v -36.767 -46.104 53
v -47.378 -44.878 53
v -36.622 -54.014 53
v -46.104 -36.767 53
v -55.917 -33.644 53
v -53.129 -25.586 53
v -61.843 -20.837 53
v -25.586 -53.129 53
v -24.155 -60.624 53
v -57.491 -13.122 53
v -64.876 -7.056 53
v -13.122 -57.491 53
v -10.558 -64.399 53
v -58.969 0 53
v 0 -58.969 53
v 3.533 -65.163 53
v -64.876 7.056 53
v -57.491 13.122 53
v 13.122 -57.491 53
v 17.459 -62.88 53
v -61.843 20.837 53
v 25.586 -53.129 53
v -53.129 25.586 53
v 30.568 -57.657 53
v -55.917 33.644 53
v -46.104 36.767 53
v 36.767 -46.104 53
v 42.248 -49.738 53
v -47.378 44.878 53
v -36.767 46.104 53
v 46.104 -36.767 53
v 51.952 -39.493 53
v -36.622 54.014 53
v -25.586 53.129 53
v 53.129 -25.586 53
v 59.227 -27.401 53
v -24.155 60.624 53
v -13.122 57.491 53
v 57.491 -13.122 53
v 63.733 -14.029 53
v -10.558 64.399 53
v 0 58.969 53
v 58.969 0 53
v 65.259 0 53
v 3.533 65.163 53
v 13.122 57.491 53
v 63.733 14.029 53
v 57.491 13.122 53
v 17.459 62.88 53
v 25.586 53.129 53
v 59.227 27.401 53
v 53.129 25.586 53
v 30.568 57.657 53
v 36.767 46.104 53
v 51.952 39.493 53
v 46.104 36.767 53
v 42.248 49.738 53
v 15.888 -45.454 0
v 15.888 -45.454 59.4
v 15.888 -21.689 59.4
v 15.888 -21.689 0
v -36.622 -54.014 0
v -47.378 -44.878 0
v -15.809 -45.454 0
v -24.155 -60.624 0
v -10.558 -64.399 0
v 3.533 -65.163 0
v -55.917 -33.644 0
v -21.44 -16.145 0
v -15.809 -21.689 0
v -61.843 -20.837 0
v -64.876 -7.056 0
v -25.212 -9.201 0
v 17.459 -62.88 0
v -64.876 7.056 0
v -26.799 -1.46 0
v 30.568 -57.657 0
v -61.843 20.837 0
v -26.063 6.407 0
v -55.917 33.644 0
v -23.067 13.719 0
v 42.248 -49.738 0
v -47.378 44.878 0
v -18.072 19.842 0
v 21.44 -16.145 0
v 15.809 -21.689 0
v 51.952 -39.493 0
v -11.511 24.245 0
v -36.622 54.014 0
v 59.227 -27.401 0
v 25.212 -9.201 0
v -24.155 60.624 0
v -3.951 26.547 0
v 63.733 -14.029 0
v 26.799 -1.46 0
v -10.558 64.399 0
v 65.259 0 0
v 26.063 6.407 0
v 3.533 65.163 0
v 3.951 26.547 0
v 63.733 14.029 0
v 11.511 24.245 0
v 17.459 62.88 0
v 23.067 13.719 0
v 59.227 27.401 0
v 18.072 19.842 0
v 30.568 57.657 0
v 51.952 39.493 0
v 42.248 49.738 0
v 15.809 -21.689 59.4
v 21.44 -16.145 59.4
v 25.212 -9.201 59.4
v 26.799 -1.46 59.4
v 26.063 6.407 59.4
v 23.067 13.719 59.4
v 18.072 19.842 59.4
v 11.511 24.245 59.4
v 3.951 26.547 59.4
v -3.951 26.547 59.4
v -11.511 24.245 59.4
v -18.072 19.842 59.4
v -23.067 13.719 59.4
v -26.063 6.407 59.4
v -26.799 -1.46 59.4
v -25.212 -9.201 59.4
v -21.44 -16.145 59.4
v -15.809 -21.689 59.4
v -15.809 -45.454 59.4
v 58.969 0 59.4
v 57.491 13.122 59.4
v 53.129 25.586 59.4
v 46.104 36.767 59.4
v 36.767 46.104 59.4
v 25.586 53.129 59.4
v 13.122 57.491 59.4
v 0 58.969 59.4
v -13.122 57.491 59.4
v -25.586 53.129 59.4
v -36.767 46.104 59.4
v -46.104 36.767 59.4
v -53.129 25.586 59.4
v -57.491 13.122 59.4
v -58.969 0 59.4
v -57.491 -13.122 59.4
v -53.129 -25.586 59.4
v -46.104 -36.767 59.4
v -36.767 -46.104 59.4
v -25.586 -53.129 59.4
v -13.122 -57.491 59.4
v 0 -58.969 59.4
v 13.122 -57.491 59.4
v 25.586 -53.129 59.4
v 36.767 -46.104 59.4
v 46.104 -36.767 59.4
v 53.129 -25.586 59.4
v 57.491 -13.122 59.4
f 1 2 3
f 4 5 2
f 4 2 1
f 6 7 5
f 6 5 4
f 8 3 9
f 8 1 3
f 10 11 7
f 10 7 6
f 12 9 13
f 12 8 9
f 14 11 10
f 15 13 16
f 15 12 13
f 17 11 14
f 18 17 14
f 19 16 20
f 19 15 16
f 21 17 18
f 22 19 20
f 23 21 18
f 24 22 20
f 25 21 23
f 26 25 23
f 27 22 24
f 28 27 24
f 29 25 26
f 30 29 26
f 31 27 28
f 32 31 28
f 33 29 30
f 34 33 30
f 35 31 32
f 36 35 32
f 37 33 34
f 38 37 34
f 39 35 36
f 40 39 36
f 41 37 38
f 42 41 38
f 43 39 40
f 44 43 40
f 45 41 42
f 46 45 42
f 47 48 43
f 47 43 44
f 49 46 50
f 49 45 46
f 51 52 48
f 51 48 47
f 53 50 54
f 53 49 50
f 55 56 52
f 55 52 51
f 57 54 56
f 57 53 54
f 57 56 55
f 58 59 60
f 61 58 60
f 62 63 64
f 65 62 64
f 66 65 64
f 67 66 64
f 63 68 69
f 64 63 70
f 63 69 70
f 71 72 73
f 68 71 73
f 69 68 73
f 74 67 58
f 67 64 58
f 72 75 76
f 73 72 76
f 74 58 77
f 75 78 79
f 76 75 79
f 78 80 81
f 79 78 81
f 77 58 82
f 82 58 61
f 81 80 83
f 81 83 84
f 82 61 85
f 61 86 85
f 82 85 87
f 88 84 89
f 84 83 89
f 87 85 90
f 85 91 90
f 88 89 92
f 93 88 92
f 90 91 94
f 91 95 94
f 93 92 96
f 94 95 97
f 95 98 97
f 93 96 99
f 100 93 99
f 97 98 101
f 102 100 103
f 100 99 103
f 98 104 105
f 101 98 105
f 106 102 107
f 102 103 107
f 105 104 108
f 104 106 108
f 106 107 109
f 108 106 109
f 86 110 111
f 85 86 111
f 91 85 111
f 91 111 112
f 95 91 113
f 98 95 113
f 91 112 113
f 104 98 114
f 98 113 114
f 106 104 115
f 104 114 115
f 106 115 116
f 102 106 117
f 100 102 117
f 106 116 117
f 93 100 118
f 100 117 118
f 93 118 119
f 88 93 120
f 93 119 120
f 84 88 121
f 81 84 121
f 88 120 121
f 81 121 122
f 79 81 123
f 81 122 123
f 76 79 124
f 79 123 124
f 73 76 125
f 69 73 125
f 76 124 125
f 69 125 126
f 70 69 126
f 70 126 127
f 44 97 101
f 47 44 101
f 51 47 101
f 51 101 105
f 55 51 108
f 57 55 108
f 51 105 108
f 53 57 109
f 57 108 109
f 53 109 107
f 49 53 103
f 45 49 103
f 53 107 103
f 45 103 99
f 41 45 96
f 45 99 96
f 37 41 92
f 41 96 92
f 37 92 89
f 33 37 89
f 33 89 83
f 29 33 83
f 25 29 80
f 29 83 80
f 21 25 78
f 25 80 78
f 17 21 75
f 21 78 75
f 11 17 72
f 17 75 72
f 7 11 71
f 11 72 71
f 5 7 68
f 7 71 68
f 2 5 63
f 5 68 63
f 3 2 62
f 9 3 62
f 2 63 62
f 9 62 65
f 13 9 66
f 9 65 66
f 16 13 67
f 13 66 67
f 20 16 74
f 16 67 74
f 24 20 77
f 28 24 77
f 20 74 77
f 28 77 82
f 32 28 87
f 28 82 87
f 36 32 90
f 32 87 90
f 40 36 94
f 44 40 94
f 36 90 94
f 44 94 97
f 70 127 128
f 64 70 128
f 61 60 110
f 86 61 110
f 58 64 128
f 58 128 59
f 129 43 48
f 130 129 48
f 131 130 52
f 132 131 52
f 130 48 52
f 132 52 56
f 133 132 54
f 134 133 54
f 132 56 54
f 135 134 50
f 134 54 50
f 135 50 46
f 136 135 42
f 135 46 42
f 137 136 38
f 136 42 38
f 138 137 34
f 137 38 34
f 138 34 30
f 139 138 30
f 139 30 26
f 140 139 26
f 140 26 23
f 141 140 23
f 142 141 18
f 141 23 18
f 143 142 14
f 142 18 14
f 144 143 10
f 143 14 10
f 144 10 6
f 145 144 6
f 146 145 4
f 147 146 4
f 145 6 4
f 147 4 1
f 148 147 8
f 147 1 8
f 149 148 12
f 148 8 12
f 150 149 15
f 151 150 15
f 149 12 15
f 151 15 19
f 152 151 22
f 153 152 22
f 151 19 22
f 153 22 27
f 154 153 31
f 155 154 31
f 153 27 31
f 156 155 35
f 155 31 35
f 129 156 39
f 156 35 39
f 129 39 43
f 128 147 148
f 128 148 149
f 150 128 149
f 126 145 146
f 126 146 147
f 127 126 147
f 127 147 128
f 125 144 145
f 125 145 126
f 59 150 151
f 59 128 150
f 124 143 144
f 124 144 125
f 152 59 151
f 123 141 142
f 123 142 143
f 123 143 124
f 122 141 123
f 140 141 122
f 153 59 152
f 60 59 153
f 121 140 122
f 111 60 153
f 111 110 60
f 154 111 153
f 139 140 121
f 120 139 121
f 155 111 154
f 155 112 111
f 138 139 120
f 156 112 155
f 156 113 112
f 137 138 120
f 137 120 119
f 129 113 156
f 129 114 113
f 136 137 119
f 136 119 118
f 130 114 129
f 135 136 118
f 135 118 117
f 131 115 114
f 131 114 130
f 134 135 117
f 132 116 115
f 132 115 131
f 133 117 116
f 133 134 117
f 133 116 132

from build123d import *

# Parameters (mm, degrees)
F0_R     = 65.258808
F1_DEPTH = 53
F2_R     = 58.968994
F3_DEPTH = 6.4
F5_DEPTH = 73.5


with BuildPart() as f1:
    # F0 (on Top) → F1 (new body)
    with BuildSketch(Plane.XY):
        Circle(F0_R)
    extrude(amount=F1_DEPTH)

    # F2 (on face) → F3 (join)
    with BuildSketch(Plane.XY.offset(53)):
        Circle(F2_R)
    extrude(amount=F3_DEPTH)

    # F4 (on face) → F5 (cut)
    with BuildSketch(Plane.XY.offset(59.4)):
        with BuildLine():
            Line((15.88816, -21.688723), (15.809092, -21.688723))
            ThreePointArc((15.809092, -21.688723), (0, 26.838929), (-15.809092, -21.688723))
            Line((-15.809092, -21.688723), (-15.809092, -45.453947))
            Line((-15.809092, -45.453947), (15.88816, -45.453947))
            Line((15.88816, -45.453947), (15.88816, -21.688723))
        make_face()
    extrude(amount=-F5_DEPTH, mode=Mode.SUBTRACT)


solid = f1.part
